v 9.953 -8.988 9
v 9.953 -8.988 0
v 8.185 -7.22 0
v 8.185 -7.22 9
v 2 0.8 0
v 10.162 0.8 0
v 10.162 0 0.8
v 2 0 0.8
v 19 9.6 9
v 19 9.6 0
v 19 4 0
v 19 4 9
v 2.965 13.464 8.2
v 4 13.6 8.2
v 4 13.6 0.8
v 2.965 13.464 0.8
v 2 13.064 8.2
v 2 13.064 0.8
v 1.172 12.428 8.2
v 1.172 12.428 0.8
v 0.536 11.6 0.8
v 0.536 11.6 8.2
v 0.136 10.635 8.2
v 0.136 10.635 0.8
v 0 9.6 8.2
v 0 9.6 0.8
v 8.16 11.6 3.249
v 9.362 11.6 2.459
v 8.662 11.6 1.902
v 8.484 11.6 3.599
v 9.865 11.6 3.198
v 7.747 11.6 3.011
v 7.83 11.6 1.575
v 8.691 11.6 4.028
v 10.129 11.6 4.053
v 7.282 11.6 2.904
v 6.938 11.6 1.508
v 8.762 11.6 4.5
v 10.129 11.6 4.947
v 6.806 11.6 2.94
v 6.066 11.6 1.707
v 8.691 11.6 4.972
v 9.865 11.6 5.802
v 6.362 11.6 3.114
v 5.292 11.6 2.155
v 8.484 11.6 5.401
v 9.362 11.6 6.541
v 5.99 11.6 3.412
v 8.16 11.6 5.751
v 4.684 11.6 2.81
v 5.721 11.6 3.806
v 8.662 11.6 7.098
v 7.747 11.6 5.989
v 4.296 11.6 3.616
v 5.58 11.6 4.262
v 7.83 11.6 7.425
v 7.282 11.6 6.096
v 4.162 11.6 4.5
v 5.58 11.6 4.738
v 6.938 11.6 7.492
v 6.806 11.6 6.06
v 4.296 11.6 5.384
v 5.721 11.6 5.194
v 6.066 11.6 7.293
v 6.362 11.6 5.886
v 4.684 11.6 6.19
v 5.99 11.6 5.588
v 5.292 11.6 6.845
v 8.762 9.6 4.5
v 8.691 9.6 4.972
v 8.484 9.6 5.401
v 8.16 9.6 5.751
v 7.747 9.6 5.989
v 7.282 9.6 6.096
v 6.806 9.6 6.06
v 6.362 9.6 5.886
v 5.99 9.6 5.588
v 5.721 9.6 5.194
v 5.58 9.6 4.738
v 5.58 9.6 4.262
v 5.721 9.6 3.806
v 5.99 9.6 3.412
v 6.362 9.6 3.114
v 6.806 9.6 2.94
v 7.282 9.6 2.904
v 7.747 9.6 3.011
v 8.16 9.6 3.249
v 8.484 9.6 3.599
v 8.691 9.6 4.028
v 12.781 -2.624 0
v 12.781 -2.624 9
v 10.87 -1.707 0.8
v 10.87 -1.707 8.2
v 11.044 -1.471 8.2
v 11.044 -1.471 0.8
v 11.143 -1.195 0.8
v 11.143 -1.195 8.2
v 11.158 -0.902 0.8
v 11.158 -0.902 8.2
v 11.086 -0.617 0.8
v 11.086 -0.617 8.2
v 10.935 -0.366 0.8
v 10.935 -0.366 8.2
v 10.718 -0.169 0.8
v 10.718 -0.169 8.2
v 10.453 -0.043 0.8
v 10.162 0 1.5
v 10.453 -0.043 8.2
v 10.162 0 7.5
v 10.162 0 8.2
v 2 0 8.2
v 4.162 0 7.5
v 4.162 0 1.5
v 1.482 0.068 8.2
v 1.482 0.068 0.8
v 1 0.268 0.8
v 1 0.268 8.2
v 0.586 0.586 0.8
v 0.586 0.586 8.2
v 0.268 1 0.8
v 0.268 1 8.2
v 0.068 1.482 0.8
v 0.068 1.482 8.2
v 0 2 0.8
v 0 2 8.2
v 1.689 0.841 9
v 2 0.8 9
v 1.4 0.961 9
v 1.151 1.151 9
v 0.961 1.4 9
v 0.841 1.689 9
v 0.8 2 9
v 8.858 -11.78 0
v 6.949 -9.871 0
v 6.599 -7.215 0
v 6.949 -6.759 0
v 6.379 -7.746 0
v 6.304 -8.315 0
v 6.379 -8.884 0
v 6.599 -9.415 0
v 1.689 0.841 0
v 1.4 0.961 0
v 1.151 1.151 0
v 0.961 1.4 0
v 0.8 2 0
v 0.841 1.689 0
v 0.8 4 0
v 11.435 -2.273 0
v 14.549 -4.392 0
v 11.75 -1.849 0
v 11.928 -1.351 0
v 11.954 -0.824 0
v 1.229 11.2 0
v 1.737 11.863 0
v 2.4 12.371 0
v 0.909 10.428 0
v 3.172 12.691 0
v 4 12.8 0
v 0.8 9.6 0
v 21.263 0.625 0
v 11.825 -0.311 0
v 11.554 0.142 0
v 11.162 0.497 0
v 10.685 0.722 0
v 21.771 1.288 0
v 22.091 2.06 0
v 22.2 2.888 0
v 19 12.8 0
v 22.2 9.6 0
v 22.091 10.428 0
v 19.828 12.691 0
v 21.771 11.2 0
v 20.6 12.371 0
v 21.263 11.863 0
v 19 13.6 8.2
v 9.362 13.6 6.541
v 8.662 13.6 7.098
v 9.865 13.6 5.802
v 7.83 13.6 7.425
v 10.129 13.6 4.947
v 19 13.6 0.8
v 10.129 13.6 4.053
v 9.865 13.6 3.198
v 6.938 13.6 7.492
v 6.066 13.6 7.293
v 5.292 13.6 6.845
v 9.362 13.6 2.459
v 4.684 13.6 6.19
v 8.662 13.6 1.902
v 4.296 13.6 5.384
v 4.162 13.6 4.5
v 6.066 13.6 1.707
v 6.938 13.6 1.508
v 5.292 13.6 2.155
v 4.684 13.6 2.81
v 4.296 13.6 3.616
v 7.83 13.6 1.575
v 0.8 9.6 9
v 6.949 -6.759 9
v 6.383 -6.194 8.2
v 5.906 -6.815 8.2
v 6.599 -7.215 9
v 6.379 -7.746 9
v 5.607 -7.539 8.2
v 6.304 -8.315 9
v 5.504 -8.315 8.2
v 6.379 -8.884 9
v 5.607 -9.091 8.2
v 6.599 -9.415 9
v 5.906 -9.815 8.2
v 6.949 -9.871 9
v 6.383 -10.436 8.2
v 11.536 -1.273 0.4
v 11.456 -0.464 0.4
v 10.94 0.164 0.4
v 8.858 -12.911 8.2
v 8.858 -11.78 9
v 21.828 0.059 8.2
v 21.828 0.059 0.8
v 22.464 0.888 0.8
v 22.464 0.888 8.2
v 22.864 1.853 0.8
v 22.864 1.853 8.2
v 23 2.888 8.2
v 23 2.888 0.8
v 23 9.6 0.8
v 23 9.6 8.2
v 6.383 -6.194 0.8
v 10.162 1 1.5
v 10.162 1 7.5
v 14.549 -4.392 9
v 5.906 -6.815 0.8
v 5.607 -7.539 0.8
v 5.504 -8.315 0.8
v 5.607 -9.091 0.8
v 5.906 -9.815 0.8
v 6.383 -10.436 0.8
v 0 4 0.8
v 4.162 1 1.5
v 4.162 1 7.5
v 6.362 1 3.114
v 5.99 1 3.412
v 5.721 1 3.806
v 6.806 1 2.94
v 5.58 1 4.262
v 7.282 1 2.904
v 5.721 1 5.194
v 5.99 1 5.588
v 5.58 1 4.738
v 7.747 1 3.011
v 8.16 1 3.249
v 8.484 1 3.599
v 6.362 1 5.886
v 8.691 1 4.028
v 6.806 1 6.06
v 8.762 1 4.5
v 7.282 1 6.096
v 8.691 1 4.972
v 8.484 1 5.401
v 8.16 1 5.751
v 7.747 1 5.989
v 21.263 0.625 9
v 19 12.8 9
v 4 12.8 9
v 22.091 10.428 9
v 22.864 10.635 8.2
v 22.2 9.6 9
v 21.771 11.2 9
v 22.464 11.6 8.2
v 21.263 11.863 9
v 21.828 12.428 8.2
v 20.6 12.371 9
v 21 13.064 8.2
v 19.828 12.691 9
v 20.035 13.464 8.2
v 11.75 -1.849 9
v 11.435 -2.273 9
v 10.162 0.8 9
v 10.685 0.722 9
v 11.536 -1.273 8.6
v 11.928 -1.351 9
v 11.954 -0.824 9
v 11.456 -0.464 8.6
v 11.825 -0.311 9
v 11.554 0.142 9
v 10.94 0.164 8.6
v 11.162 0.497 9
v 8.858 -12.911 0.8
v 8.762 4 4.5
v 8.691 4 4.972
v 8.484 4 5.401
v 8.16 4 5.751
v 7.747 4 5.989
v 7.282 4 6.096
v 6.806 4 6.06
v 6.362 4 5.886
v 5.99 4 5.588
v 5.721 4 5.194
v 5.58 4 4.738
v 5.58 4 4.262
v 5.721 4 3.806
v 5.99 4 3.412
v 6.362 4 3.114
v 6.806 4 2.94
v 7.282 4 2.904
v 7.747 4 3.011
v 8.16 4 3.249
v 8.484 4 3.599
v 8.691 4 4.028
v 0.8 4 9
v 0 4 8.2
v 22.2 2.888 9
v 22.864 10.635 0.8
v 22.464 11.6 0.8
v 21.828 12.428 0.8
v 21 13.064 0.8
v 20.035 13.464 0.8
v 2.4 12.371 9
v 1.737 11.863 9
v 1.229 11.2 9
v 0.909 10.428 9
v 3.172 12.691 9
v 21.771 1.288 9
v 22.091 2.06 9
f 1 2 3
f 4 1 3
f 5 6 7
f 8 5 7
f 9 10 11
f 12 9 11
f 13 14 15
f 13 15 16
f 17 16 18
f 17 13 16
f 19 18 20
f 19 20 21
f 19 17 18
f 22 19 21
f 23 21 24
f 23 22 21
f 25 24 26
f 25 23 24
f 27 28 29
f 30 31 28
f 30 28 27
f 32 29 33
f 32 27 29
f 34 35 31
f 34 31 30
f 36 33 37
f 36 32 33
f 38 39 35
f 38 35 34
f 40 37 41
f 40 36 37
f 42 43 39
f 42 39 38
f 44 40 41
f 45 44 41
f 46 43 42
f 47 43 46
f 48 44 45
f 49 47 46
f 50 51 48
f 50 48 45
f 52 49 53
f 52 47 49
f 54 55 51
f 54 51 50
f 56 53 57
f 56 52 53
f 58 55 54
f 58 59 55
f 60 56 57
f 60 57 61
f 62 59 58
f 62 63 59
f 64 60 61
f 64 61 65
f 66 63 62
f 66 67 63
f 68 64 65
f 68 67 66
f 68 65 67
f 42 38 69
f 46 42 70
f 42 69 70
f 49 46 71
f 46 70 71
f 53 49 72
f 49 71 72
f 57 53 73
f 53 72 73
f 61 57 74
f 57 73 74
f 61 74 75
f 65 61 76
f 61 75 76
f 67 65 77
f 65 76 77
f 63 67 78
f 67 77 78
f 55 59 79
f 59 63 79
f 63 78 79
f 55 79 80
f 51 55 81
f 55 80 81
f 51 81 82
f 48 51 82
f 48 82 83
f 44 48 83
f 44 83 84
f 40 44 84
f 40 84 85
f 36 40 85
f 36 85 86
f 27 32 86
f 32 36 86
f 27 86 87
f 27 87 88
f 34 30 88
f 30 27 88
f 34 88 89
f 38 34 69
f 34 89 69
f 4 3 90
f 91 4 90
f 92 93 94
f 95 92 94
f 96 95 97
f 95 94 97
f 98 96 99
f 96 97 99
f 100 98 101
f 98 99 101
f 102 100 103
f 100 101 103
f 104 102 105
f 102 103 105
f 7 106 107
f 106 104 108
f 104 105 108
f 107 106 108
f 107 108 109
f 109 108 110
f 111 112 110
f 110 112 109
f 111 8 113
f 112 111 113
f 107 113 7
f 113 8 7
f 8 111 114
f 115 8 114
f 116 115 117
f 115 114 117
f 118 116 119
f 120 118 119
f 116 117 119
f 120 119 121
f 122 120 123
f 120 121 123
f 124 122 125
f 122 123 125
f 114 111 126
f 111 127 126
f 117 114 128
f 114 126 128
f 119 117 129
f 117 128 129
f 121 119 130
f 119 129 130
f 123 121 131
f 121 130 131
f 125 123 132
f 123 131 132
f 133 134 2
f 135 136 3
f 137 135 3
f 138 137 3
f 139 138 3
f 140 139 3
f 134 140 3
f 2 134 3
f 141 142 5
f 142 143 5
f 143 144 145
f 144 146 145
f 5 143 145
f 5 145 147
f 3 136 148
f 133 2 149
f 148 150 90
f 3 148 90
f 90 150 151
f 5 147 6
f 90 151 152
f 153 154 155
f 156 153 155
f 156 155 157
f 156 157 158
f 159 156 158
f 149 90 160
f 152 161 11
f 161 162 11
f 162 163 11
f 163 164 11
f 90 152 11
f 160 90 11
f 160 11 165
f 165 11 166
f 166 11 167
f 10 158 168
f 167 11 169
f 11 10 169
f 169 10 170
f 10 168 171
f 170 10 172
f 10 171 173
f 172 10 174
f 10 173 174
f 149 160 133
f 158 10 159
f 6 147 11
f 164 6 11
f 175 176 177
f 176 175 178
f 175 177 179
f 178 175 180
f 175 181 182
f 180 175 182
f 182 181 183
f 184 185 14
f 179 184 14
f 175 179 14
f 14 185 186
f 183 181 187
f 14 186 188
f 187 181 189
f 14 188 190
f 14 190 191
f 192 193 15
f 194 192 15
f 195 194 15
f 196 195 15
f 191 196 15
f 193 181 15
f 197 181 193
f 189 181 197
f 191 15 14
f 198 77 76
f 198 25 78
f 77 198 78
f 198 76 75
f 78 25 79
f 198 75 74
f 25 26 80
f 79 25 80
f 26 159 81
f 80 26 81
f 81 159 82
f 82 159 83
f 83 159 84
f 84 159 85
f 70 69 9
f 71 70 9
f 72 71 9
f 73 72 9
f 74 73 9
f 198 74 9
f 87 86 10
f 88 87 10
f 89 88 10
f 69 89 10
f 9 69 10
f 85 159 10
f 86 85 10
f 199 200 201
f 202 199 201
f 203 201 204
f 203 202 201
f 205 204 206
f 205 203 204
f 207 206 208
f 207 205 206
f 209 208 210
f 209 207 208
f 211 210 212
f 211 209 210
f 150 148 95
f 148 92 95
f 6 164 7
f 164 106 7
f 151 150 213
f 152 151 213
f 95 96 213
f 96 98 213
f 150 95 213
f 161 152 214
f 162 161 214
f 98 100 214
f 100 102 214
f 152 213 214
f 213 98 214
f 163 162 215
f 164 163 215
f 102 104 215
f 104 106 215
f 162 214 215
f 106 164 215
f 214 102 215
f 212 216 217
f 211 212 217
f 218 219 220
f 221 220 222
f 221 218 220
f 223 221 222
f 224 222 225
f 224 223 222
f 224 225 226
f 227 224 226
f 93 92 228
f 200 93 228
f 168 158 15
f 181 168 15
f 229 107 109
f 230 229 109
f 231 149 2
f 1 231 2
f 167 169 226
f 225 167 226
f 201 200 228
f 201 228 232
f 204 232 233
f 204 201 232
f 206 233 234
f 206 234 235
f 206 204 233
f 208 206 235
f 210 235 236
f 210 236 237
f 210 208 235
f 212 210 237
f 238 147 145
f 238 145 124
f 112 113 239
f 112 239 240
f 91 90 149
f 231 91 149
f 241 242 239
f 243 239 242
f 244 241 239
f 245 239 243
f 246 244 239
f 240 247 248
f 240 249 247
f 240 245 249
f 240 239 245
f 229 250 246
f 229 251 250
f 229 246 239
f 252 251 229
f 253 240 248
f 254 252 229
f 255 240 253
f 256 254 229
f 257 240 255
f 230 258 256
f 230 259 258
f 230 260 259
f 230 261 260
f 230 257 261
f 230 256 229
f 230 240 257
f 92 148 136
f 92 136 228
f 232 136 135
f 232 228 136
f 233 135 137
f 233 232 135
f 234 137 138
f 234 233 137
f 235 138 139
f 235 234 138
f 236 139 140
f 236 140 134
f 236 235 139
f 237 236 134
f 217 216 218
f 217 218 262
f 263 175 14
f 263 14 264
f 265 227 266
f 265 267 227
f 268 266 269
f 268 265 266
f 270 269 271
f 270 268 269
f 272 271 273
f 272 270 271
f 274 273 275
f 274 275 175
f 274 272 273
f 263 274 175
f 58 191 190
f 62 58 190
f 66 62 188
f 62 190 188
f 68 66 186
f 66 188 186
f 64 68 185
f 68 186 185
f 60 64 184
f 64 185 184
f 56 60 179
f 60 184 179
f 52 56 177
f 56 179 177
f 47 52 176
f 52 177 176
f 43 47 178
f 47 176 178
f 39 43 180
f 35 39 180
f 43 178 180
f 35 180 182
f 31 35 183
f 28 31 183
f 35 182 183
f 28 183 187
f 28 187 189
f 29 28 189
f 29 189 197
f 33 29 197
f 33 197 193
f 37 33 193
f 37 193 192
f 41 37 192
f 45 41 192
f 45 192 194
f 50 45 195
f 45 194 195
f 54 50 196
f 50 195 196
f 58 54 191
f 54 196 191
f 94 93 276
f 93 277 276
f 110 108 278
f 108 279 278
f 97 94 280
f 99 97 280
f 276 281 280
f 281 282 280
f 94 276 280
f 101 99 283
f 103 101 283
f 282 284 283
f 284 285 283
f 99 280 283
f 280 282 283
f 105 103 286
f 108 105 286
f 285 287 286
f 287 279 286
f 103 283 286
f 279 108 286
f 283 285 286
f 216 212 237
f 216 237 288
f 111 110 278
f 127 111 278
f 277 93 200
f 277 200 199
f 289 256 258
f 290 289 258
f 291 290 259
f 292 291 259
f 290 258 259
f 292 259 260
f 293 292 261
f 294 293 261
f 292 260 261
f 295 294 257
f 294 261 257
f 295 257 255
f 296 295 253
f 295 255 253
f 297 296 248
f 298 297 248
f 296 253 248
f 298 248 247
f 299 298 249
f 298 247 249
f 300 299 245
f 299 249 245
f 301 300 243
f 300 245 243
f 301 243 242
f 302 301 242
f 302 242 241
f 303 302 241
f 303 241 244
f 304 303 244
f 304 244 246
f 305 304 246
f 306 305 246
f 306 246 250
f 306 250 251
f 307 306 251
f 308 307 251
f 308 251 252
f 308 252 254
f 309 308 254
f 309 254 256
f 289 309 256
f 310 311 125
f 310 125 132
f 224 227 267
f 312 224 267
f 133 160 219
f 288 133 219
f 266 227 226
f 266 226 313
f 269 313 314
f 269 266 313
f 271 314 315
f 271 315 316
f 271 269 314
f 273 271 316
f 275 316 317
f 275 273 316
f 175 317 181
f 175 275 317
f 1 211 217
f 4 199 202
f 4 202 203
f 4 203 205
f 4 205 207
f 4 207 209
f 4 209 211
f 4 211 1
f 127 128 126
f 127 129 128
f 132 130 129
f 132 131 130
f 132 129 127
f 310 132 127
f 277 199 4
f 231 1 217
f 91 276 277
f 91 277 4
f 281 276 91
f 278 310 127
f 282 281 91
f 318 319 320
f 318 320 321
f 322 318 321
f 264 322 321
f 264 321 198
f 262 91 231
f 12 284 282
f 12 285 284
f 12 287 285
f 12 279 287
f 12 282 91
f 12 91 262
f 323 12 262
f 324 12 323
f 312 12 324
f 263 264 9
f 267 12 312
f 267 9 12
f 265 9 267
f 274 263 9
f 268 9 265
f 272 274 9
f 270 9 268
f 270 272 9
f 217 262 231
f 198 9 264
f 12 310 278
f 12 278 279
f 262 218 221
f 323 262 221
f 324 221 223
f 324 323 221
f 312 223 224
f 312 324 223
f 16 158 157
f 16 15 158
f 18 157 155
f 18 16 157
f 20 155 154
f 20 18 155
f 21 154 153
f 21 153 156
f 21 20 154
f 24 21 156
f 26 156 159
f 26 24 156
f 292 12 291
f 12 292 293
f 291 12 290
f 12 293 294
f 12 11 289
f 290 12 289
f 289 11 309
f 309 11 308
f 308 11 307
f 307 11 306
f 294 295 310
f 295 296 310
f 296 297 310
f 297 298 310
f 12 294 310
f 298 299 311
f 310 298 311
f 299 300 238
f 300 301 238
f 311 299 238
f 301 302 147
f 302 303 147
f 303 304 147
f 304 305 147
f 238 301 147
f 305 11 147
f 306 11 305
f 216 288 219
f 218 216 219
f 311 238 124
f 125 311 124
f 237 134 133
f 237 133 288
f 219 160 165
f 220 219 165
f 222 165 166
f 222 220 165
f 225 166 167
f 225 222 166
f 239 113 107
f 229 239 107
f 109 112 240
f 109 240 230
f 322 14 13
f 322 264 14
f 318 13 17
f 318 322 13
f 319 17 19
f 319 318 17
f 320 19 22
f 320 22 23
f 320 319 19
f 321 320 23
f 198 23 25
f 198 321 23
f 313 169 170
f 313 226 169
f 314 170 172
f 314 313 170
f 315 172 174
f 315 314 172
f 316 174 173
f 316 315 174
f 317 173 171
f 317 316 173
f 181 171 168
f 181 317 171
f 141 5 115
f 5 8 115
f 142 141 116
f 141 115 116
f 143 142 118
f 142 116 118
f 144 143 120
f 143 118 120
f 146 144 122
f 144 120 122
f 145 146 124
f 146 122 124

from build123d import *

# Parameters (mm, degrees)
F1_DEPTH      = 9
F2_R          = 3.99999
F3_R          = 1
F4_R          = 2
F5_W          = 6
F5_H          = 6
F6_DEPTH      = 1
F7_R          = 1.6
F8_DEPTH      = 12.601
F9_R          = 3
F9_R_2        = 1.6
F10_DEPTH     = 2
F12_DEPTH     = 9.001
F13_R         = 3
F14_T1_DEPTH  = 20.400496283
F14_T3_DEPTH  = 8.1624490891
F14_T5_DEPTH  = 15.00002
F14_T7_DEPTH  = 6.3449613941
F14_T9_DEPTH  = 5.5573463904
F14_T11_DEPTH = 4.0573463904
F14_T13_DEPTH = 2.0573563904
F14_T15_DEPTH = 6.7122106995
F14_T18_ANGLE = 90
F14_T20_ANGLE = 135
F14_T22_ANGLE = 90
F14_T24_ANGLE = 90
F14_T26_ANGLE = 90
F14_T28_ANGLE = 45
F14_T30_ANGLE = 90
F14_T32_ANGLE = 135
F14_T34_ANGLE = 90
F14_T36_ANGLE = 45
F14_T38_ANGLE = 90
F14_T40_ANGLE = 90


# Not quite as in the source:
# - a fillet or chamfer that OpenCascade refuses, or shapes differently, is made with other operations: its cross-section is extruded or revolved along the edge and cut away or added
# - a fillet or chamfer is up to 0.001 mm smaller than in the source, because OpenCascade refuses the exact size


with BuildPart() as f1:
    # F0 (on Top) → F1 (new body)
    with BuildSketch(Plane.XY):
        Polygon((0, 4), (0, 0), (12.5766626515, 0), (4.2616702986, -8.3149923529), (8.8578643763, -12.9111864306), (23, 1.2309491931), (23, 13.6), (0, 13.6), (0, 9.6), (19, 9.6), (19, 4), align=None)
    extrude(amount=F1_DEPTH)

    # F2 (radius 4 in the source; OpenCascade refuses exactly that, so slightly less here)
    f2_edges = [f1.edges().sort_by_distance(p)[0] for p in [
        (23, 13.6, 4.5),
        (0, 13.6, 4.5),
        (23, 1.230949, 4.5),
    ]]
    fillet(f2_edges, radius=F2_R)

    # F3
    f3_edges = [f1.edges().sort_by_distance(p)[0] for p in [
        (12.576663, 0, 4.5),
    ]]
    fillet(f3_edges, radius=F3_R)

    # F4
    f4_edges = [f1.edges().sort_by_distance(p)[0] for p in [
        (0, 0, 4.5),
    ]]
    fillet(f4_edges, radius=F4_R)

    # F5 (on face) → F6 (cut)
    with BuildSketch(Plane.XZ):
        with Locations((7.1624490891, 4.5)):
            Rectangle(F5_W, F5_H)
    extrude(amount=-F6_DEPTH, mode=Mode.SUBTRACT)

    # F7 (on face) → F8 (cut, through all)
    with BuildSketch(Plane.XZ.offset(-1)):
        with Locations((7.1624490891, 4.5)):
            Circle(F7_R)
    extrude(amount=-F8_DEPTH, mode=Mode.SUBTRACT)

    # F9 (on face) → F10 (cut)
    with BuildSketch(Plane(origin=(0, 13.6, 0), x_dir=(-1, 0, 0), z_dir=(0, 1, 0))):
        with Locations((-7.1624490891, 4.5)):
            Circle(F9_R)
        with Locations((-7.1624490891, 4.5)):
            Circle(F9_R_2, mode=Mode.SUBTRACT)
    extrude(amount=-F10_DEPTH, mode=Mode.SUBTRACT)

    # F11 (on face) → F12 (cut, through all)
    with BuildSketch(Plane(origin=(0, 0, 0), x_dir=(1, 0, 0), z_dir=(0, 0, -1))):
        Polygon((12.7809664736, 2.6241233026), (14.5487334265, 4.3918902556), (9.9525393488, 8.9880843333), (8.1847723959, 7.2203173803), align=None)
    extrude(amount=-F12_DEPTH, mode=Mode.SUBTRACT)

    # F13
    f13_edges = [f1.edges().sort_by_distance(p)[0] for p in [
        (4.26167, -8.314992, 4.5),
    ]]
    fillet(f13_edges, radius=F13_R)

    # F14: chamfer of 0.8 on 4 edges, made by hand

    # F14_s2 → F14_t1 (cut)
    with BuildSketch(Plane(origin=(-3.4814246111, -3.4814246111, 0), x_dir=(0, 0, 1), z_dir=(0.7071067812, 0.7071067812, 0))):
        Polygon((8.2, 15.3930434455), (9, 14.5930434455), (9, 15.3930434455), align=None)
        Polygon((0, 14.5930434455), (0.8, 15.3930434455), (0, 15.3930434455), align=None)
    extrude(amount=F14_T1_DEPTH, mode=Mode.SUBTRACT)

    # F14_s4 → F14_t3 (cut)
    with BuildSketch(Plane.YZ.offset(2)):
        Polygon((0, 8.2), (0.8, 9), (0, 9), align=None)
        Polygon((0.8, 0), (0, 0.8), (0, 0), align=None)
    extrude(amount=F14_T3_DEPTH, mode=Mode.SUBTRACT)

    # F14_s6 → F14_t5 (cut)
    with BuildSketch(Plane.YZ.offset(3.99999)):
        Polygon((12.8, 0), (13.6, 0.8), (13.6, 0), align=None)
        Polygon((13.6, 8.2), (12.8, 9), (13.6, 9), align=None)
    extrude(amount=F14_T5_DEPTH, mode=Mode.SUBTRACT)

    # F14_s8 → F14_t7 (cut)
    with BuildSketch(Plane(origin=(4.5812245445, 4.5812245445, 0), x_dir=(0, 0, 1), z_dir=(-0.7071067812, -0.7071067812, 0))):
        Polygon((0, -9.6930434455), (0.8, -8.8930434455), (0, -8.8930434455), align=None)
        Polygon((8.2, -8.8930434455), (9, -9.6930434455), (9, -8.8930434455), align=None)
    extrude(amount=F14_T7_DEPTH, mode=Mode.SUBTRACT)

    # F14_s10 → F14_t9 (cut)
    with BuildSketch(Plane(origin=(8.4096516693, -8.4096516693, 0), x_dir=(0, 0, 1), z_dir=(0.7071067812, -0.7071067812, 0))):
        Polygon((0, 2.066131511), (0.8, 2.866131511), (0, 2.866131511), align=None)
        Polygon((8.2, 2.866131511), (9, 2.066131511), (9, 2.866131511), align=None)
    extrude(amount=F14_T9_DEPTH, mode=Mode.SUBTRACT)

    # F14_s12 → F14_t11 (cut)
    with BuildSketch(Plane.XZ.offset(-6.0573463904)):
        Polygon((0.8, 0), (0, 0.8), (0, 0), align=None)
        Polygon((0, 8.2), (0.8, 9), (0, 9), align=None)
    extrude(amount=F14_T11_DEPTH, mode=Mode.SUBTRACT)

    # F14_s14 → F14_t13 (cut)
    with BuildSketch(Plane.XZ.offset(-9.60001)):
        Polygon((0.8, 0), (0, 0.8), (0, 0), align=None)
        Polygon((0, 8.2), (0.8, 9), (0, 9), align=None)
    extrude(amount=F14_T13_DEPTH, mode=Mode.SUBTRACT)

    # F14_s16 → F14_t15 (cut)
    with BuildSketch(Plane.XZ.offset(-9.60001)):
        Polygon((22.2, 0), (23, 0.8), (23, 0), align=None)
        Polygon((23, 8.2), (22.2, 9), (23, 9), align=None)
    extrude(amount=F14_T15_DEPTH, mode=Mode.SUBTRACT)

    # F14_s17 → F14_t18 (revolve, cut)
    with BuildSketch(Plane.YZ.offset(2)):
        Polygon((0.8, 0), (0, 0.8), (0, 0), align=None)
    revolve(axis=Axis((2, 2, 0), (0, 0, -1)), revolution_arc=F14_T18_ANGLE, mode=Mode.SUBTRACT)

    # F14_s19 → F14_t20 (revolve, cut)
    with BuildSketch(Plane(origin=(4.5812245445, 4.5812245445, 0), x_dir=(0, 0, 1), z_dir=(-0.7071067812, -0.7071067812, 0))):
        Polygon((0, -9.6930434455), (0.8, -8.8930434455), (0, -8.8930434455), align=None)
    revolve(axis=Axis((10.1624490891, -1, 0), (0, 0, 1)), revolution_arc=F14_T20_ANGLE, mode=Mode.SUBTRACT)

    # F14_s21 → F14_t22 (revolve, cut)
    with BuildSketch(Plane(origin=(0.0946593164, 0.0946593164, 0), x_dir=(0, 0, 1), z_dir=(0.7071067812, 0.7071067812, 0))):
        Polygon((0, 9.6930434455), (0.8, 8.8930434455), (0, 8.8930434455), align=None)
    revolve(axis=Axis((8.5043109857, -8.3149923529, 0), (0, 0, 1)), revolution_arc=F14_T22_ANGLE, mode=Mode.SUBTRACT)

    # F14_s23 → F14_t24 (revolve, cut)
    with BuildSketch(Plane.XZ.offset(-9.60001)):
        Polygon((22.2, 0), (23, 0.8), (23, 0), align=None)
    revolve(axis=Axis((19.00001, 9.60001, 0), (0, 0, 1)), revolution_arc=F14_T24_ANGLE, mode=Mode.SUBTRACT)

    # F14_s25 → F14_t26 (revolve, cut)
    with BuildSketch(Plane.YZ.offset(3.99999)):
        Polygon((12.8, 0), (13.6, 0.8), (13.6, 0), align=None)
    revolve(axis=Axis((3.99999, 9.60001, 0), (0, 0, 1)), revolution_arc=F14_T26_ANGLE, mode=Mode.SUBTRACT)

    # F14_s27 → F14_t28 (revolve, cut)
    with BuildSketch(Plane(origin=(10.9439046502, 10.9439046502, 0), x_dir=(0, 0, 1), z_dir=(-0.7071067812, -0.7071067812, 0))):
        Polygon((0, -14.5930434455), (0.8, -15.3930434455), (0, -15.3930434455), align=None)
    revolve(axis=Axis((19.00001, 2.8877993005, 0), (0, 0, 1)), revolution_arc=F14_T28_ANGLE, mode=Mode.SUBTRACT)

    # F14_s29 → F14_t30 (revolve, cut)
    with BuildSketch(Plane.YZ.offset(2)):
        Polygon((0, 8.2), (0.8, 9), (0, 9), align=None)
    revolve(axis=Axis((2, 2, 9), (0, 0, -1)), revolution_arc=F14_T30_ANGLE, mode=Mode.SUBTRACT)

    # F14_s31 → F14_t32 (revolve, cut)
    with BuildSketch(Plane(origin=(4.5812245445, 4.5812245445, 0), x_dir=(0, 0, 1), z_dir=(-0.7071067812, -0.7071067812, 0))):
        Polygon((8.2, -8.8930434455), (9, -9.6930434455), (9, -8.8930434455), align=None)
    revolve(axis=Axis((10.1624490891, -1, 9), (0, 0, 1)), revolution_arc=F14_T32_ANGLE, mode=Mode.SUBTRACT)

    # F14_s33 → F14_t34 (revolve, cut)
    with BuildSketch(Plane(origin=(0.0946593164, 0.0946593164, 0), x_dir=(0, 0, 1), z_dir=(0.7071067812, 0.7071067812, 0))):
        Polygon((8.2, 8.8930434455), (9, 9.6930434455), (9, 8.8930434455), align=None)
    revolve(axis=Axis((8.5043109857, -8.3149923529, 9), (0, 0, 1)), revolution_arc=F14_T34_ANGLE, mode=Mode.SUBTRACT)

    # F14_s35 → F14_t36 (revolve, cut)
    with BuildSketch(Plane(origin=(10.9439046502, 10.9439046502, 0), x_dir=(0, 0, 1), z_dir=(-0.7071067812, -0.7071067812, 0))):
        Polygon((8.2, -15.3930434455), (9, -14.5930434455), (9, -15.3930434455), align=None)
    revolve(axis=Axis((19.00001, 2.8877993005, 9), (0, 0, 1)), revolution_arc=F14_T36_ANGLE, mode=Mode.SUBTRACT)

    # F14_s37 → F14_t38 (revolve, cut)
    with BuildSketch(Plane.XZ.offset(-9.60001)):
        Polygon((23, 8.2), (22.2, 9), (23, 9), align=None)
    revolve(axis=Axis((19.00001, 9.60001, 9), (0, 0, 1)), revolution_arc=F14_T38_ANGLE, mode=Mode.SUBTRACT)

    # F14_s39 → F14_t40 (revolve, cut)
    with BuildSketch(Plane.YZ.offset(3.99999)):
        Polygon((13.6, 8.2), (12.8, 9), (13.6, 9), align=None)
    revolve(axis=Axis((3.99999, 9.60001, 9), (0, 0, 1)), revolution_arc=F14_T40_ANGLE, mode=Mode.SUBTRACT)


solid = f1.part
